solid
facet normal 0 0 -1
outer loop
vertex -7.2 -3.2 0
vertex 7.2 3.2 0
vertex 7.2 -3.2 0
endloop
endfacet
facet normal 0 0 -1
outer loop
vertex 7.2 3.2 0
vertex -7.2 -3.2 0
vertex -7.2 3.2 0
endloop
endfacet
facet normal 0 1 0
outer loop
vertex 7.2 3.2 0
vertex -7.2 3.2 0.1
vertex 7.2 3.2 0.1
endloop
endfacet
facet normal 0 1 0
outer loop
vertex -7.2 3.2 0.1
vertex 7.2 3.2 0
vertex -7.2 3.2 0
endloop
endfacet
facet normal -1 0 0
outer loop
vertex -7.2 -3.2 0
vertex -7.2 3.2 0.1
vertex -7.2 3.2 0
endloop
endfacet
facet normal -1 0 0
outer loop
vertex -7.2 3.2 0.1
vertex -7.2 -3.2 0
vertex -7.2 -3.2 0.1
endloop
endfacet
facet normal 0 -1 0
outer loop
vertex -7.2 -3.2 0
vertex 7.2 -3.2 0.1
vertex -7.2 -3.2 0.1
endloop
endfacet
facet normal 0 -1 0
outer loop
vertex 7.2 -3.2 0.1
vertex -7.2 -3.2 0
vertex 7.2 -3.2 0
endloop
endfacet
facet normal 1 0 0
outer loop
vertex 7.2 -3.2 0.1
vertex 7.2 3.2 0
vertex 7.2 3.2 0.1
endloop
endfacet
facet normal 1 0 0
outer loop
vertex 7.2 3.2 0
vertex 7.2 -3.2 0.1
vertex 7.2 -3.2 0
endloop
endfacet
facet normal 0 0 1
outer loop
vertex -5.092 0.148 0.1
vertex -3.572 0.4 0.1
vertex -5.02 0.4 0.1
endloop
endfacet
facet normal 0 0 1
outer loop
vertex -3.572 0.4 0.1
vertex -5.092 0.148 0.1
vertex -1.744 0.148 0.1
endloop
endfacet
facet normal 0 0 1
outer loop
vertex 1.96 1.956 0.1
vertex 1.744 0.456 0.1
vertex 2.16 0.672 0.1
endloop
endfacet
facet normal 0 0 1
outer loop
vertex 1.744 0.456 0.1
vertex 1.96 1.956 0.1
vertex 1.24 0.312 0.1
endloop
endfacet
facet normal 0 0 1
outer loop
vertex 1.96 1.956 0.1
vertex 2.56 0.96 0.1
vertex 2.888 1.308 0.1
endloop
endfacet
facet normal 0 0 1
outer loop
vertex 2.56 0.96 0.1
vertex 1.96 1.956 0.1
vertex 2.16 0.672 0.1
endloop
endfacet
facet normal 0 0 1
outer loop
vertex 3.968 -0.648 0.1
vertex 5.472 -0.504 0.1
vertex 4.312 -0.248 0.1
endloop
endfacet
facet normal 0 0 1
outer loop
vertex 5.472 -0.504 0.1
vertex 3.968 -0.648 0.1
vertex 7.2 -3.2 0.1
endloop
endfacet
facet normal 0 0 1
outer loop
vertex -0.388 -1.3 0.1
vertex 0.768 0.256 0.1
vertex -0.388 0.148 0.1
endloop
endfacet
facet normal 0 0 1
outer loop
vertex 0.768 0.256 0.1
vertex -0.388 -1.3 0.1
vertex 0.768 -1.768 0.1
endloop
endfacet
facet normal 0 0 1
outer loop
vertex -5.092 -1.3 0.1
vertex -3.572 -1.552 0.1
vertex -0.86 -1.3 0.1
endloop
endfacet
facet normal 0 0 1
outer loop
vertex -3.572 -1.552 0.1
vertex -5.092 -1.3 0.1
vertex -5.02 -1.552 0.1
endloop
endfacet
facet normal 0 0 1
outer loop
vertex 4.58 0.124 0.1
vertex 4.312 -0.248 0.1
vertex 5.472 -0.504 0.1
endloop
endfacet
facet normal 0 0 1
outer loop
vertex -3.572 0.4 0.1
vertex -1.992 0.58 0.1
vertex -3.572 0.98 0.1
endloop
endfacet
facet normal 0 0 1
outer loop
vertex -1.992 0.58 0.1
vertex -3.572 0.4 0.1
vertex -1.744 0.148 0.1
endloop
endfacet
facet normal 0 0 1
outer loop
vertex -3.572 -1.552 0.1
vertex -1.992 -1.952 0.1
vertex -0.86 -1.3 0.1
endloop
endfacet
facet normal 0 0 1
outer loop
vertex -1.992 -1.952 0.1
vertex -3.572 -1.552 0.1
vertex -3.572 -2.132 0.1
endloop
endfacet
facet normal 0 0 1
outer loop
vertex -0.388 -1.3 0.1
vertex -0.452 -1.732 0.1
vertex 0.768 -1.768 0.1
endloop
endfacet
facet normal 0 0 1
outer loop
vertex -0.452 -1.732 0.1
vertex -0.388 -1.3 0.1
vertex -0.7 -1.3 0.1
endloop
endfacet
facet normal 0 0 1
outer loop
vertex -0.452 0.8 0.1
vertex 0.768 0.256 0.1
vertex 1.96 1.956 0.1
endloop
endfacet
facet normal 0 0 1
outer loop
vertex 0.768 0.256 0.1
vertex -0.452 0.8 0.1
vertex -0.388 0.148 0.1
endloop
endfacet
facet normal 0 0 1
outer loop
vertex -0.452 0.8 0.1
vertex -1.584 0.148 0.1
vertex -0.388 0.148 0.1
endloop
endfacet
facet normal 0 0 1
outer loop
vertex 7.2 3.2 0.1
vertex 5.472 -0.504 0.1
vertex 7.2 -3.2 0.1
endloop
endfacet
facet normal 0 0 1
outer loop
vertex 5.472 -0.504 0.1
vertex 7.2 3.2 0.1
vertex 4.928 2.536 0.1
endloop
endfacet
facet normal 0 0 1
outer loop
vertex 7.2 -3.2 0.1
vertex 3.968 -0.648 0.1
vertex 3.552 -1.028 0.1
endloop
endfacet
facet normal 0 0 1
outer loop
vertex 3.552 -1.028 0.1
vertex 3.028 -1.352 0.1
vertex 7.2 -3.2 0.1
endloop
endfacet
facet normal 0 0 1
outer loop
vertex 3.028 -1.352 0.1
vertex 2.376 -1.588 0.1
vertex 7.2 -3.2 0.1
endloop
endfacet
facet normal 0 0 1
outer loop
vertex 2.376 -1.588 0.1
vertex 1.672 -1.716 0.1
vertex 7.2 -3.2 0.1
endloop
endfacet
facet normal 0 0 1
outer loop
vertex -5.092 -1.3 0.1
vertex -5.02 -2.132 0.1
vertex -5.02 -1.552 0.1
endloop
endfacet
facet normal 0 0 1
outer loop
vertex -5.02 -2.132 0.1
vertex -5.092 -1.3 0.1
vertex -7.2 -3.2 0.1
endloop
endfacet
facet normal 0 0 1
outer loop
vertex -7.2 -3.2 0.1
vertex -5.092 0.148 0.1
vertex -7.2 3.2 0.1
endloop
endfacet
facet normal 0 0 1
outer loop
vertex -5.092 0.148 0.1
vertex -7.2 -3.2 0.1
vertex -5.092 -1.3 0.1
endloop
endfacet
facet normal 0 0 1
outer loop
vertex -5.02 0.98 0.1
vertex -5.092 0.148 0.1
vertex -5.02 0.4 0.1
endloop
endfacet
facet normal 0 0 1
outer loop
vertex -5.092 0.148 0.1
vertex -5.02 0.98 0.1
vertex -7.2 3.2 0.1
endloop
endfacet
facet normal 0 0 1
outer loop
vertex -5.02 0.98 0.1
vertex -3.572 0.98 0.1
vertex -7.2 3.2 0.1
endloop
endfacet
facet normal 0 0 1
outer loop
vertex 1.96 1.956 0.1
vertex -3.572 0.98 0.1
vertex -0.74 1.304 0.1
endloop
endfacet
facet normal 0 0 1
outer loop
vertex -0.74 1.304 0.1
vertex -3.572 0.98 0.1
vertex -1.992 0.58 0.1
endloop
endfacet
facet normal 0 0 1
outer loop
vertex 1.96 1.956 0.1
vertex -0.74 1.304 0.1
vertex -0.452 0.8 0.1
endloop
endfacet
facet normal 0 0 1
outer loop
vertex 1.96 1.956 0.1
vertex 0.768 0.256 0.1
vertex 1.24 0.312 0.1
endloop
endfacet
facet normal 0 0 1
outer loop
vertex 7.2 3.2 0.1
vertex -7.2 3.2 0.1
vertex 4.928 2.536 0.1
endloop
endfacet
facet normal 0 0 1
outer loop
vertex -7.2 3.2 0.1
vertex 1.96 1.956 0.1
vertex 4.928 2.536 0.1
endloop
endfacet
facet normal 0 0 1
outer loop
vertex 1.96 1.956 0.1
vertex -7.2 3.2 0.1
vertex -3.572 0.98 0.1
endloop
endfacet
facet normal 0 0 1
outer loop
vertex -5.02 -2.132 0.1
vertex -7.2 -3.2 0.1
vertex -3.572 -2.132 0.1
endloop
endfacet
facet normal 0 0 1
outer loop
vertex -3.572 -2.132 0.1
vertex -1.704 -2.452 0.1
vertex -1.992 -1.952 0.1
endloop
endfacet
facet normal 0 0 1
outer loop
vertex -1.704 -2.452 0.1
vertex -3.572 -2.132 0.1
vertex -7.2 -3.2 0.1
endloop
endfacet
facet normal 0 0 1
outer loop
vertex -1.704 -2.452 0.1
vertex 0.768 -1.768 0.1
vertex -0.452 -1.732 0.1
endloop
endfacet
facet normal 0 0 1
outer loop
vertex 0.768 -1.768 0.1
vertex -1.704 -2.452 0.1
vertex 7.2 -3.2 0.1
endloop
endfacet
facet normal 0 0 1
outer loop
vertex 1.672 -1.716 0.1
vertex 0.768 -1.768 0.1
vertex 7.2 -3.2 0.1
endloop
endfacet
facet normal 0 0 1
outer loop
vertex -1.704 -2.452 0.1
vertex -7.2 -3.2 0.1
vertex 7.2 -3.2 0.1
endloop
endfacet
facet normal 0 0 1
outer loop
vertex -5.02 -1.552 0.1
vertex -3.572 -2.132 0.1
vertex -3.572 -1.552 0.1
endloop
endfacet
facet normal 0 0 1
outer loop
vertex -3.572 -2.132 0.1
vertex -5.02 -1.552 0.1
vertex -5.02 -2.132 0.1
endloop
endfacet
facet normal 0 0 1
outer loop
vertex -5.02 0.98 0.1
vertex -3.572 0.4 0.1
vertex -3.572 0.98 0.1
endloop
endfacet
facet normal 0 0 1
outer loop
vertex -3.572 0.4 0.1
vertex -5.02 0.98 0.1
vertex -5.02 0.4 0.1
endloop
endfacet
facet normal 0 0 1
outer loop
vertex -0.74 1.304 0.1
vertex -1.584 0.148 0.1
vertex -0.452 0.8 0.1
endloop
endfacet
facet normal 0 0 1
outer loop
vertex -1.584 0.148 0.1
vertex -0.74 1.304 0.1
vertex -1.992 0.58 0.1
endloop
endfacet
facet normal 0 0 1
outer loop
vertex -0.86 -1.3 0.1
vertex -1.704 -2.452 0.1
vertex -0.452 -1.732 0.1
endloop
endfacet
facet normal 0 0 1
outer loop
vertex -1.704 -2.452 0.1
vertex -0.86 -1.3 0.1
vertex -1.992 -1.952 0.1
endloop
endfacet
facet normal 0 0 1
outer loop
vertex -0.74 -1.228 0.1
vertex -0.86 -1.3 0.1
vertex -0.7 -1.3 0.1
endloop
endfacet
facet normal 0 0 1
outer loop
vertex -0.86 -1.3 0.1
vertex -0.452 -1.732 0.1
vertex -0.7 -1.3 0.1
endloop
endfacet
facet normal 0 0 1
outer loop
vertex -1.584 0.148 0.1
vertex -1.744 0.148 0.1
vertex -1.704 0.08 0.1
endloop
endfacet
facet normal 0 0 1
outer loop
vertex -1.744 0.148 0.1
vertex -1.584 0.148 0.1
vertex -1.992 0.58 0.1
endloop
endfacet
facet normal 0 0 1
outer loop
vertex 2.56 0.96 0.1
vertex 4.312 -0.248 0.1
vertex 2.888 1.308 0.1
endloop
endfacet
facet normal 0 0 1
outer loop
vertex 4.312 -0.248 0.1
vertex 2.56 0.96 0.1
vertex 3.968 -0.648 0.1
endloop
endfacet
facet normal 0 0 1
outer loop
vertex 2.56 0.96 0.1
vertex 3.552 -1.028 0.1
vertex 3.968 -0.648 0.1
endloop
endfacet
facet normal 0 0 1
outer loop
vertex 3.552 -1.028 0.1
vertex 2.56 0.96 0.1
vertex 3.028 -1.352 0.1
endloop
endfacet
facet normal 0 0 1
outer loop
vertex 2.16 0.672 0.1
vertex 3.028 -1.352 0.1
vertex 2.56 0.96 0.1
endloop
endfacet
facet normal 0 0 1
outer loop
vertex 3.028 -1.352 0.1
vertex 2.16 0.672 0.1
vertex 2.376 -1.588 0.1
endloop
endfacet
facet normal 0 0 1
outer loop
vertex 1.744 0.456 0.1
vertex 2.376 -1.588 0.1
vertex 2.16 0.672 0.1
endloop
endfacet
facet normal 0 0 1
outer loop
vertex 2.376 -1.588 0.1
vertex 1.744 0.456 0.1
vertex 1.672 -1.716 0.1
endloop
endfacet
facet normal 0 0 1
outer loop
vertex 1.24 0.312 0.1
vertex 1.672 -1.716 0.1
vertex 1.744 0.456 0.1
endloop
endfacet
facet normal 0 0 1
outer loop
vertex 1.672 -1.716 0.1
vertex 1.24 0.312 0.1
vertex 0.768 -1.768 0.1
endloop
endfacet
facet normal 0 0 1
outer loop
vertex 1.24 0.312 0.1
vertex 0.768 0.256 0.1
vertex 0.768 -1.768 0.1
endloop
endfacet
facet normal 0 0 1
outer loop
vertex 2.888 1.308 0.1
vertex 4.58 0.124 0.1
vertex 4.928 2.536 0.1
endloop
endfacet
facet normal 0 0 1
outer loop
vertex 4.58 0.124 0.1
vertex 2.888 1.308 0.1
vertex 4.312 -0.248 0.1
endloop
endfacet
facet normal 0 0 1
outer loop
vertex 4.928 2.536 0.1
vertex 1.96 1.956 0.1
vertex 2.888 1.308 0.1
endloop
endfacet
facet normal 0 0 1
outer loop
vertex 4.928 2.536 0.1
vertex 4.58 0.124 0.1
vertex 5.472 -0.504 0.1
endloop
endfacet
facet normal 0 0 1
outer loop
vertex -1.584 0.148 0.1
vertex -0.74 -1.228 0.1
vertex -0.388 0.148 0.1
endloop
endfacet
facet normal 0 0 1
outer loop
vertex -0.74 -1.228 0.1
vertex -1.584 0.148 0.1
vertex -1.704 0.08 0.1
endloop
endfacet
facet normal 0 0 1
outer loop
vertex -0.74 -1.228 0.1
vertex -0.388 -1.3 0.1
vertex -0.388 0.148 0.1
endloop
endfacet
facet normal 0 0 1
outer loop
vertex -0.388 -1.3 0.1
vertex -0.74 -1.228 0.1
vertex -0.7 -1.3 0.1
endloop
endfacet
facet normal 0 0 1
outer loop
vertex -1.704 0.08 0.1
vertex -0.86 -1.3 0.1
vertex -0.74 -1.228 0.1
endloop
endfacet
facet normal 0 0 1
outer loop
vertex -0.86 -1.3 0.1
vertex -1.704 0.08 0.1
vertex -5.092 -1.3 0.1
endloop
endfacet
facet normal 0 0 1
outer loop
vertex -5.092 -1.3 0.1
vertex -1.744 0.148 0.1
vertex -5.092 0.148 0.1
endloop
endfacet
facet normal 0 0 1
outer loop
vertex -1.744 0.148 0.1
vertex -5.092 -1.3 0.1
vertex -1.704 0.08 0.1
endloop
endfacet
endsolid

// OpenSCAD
// file: ../p/box5-12.scad
use <../lib.scad>
function ldraw_lib__box5_12() = [
// 0 Box with 5 Faces without Any Edges
// 0 Name: box5-12.dat
// 0 Author: Chris Dee [cwdee]
// 0 !LDRAW_ORG Primitive UPDATE 2009-02
// 0 !LICENSE Licensed under CC BY 4.0 : see CAreadme.txt
// 
// 0 BFC CERTIFY CCW
  [0,"BFC","CERTIFY"],
  [0,"BFC","CCW"],
// 
// 0 !HISTORY 2009-09-03 [PTadmin] Official Update 2009-02
// 
// 
// 4 16 1 1 1 1 1 -1 -1 1 -1 -1 1 1
  [4,16,1,1,1,1,1,-1,-1,1,-1,-1,1,1],
// 4 16 -1 0 1 1 0 1 1 1 1 -1 1 1
  [4,16,-1,0,1,1,0,1,1,1,1,-1,1,1],
// 4 16 -1 0 -1 -1 0 1 -1 1 1 -1 1 -1
  [4,16,-1,0,-1,-1,0,1,-1,1,1,-1,1,-1],
// 4 16 1 0 -1 -1 0 -1 -1 1 -1 1 1 -1
  [4,16,1,0,-1,-1,0,-1,-1,1,-1,1,1,-1],
// 4 16 1 0 1 1 0 -1 1 1 -1 1 1 1
  [4,16,1,0,1,1,0,-1,1,1,-1,1,1,1],
// 0
];
module ldraw_lib__box5_12(step=0, col=false, unit=2/5, alt=false, line=0.2, solid=!$preview)
    makepoly(ldraw_lib__box5_12(), step=step, col=col, unit=unit, alt=alt, line=line, solid=solid);
ldraw_lib__box5_12(line=0.2);
// main file
use <../lib.scad>
use <../p/box5-12.scad>
function ldraw_lib__821577g() = [
// 0 Sticker  0.8 x  1.8 with Car and Red Left Curved Arrow
// 0 Name: 821577g.dat
// 0 Author: Evert-Jan Boer [ejboer]
// 0 !LDRAW_ORG Part UPDATE 2026-07
// 0 !LICENSE Licensed under CC BY 4.0 : see CAreadme.txt
// 
// 0 BFC CERTIFY CCW
  [0,"BFC","CERTIFY"],
  [0,"BFC","CCW"],
// 
// 0 !CATEGORY Sticker
// 0 !KEYWORDS Multi Control, Set 8082
// 
// 0 !HISTORY 2026-07-30 [OrionP] Official Update 2026-07
// 
// 1 16 0 -.25 0 18 0 0 0 0.25 0 0 0 8 box5-12.dat
  [1,16,0,-.25,0,18,0,0,0,0.25,0,0,0,8, ldraw_lib__box5_12()],
// 4 16 -12.73 -.25 .37 -4.36 -.25 .37 -8.93 -.25 1 -12.55 -.25 1
  [4,16,-12.73,-.25,.37,-4.36,-.25,.37,-8.93,-.25,1,-12.55,-.25,1],
// 4 16 4.9 -.25 4.89 3.1 -.25 .78 4.36 -.25 1.14 5.4 -.25 1.68
  [4,16,4.9,-.25,4.89,3.1,-.25,.78,4.36,-.25,1.14,5.4,-.25,1.68],
// 4 16 4.9 -.25 4.89 5.4 -.25 1.68 6.4 -.25 2.4 7.22 -.25 3.27
  [4,16,4.9,-.25,4.89,5.4,-.25,1.68,6.4,-.25,2.4,7.22,-.25,3.27],
// 4 16 13.68 -.25 -1.26 10.78 -.25 -.62 9.92 -.25 -1.62 18 -.25 -8
  [4,16,13.68,-.25,-1.26,10.78,-.25,-.62,9.92,-.25,-1.62,18,-.25,-8],
// 4 16 -.97 -.25 -3.25 1.92 -.25 -4.42 1.92 -.25 .64 -.97 -.25 .37
  [4,16,-.97,-.25,-3.25,1.92,-.25,-4.42,1.92,-.25,.64,-.97,-.25,.37],
// 4 16 -12.73 -.25 -3.25 -12.55 -.25 -3.88 -8.93 -.25 -3.88 -2.15 -.25 -3.25
  [4,16,-12.73,-.25,-3.25,-12.55,-.25,-3.88,-8.93,-.25,-3.88,-2.15,-.25,-3.25],
// 3 16 11.45 -.25 .31 10.78 -.25 -.62 13.68 -.25 -1.26
  [3,16,11.45,-.25,.31,10.78,-.25,-.62,13.68,-.25,-1.26],
// 4 16 -8.93 -.25 1 -4.36 -.25 .37 -4.98 -.25 1.45 -8.93 -.25 2.45
  [4,16,-8.93,-.25,1,-4.36,-.25,.37,-4.98,-.25,1.45,-8.93,-.25,2.45],
// 4 16 -4.98 -.25 -4.88 -2.15 -.25 -3.25 -8.93 -.25 -3.88 -8.93 -.25 -5.33
  [4,16,-4.98,-.25,-4.88,-2.15,-.25,-3.25,-8.93,-.25,-3.88,-8.93,-.25,-5.33],
// 4 16 -.97 -.25 -3.25 -1.75 -.25 -3.25 -1.13 -.25 -4.33 1.92 -.25 -4.42
  [4,16,-.97,-.25,-3.25,-1.75,-.25,-3.25,-1.13,-.25,-4.33,1.92,-.25,-4.42],
// 4 16 -1.13 -.25 2 -.97 -.25 .37 1.92 -.25 .64 4.9 -.25 4.89
  [4,16,-1.13,-.25,2,-.97,-.25,.37,1.92,-.25,.64,4.9,-.25,4.89],
// 3 16 -1.13 -.25 2 -3.96 -.25 .37 -.97 -.25 .37
  [3,16,-1.13,-.25,2,-3.96,-.25,.37,-.97,-.25,.37],
// 4 16 12.32 -.25 6.34 13.68 -.25 -1.26 18 -.25 -8 18 -.25 8
  [4,16,12.32,-.25,6.34,13.68,-.25,-1.26,18,-.25,-8,18,-.25,8],
// 3 16 18 -.25 -8 9.92 -.25 -1.62 8.88 -.25 -2.57
  [3,16,18,-.25,-8,9.92,-.25,-1.62,8.88,-.25,-2.57],
// 3 16 8.88 -.25 -2.57 7.57 -.25 -3.38 18 -.25 -8
  [3,16,8.88,-.25,-2.57,7.57,-.25,-3.38,18,-.25,-8],
// 3 16 7.57 -.25 -3.38 5.94 -.25 -3.97 18 -.25 -8
  [3,16,7.57,-.25,-3.38,5.94,-.25,-3.97,18,-.25,-8],
// 3 16 5.94 -.25 -3.97 4.18 -.25 -4.29 18 -.25 -8
  [3,16,5.94,-.25,-3.97,4.18,-.25,-4.29,18,-.25,-8],
// 4 16 -12.73 -.25 -3.25 -18 -.25 -8 -12.55 -.25 -5.33 -12.55 -.25 -3.88
  [4,16,-12.73,-.25,-3.25,-18,-.25,-8,-12.55,-.25,-5.33,-12.55,-.25,-3.88],
// 4 16 -12.73 -.25 .37 -18 -.25 8 -18 -.25 -8 -12.73 -.25 -3.25
  [4,16,-12.73,-.25,.37,-18,-.25,8,-18,-.25,-8,-12.73,-.25,-3.25],
// 4 16 -18 -.25 8 -12.73 -.25 .37 -12.55 -.25 1 -12.55 -.25 2.45
  [4,16,-18,-.25,8,-12.73,-.25,.37,-12.55,-.25,1,-12.55,-.25,2.45],
// 3 16 -12.55 -.25 2.45 -8.93 -.25 2.45 -18 -.25 8
  [3,16,-12.55,-.25,2.45,-8.93,-.25,2.45,-18,-.25,8],
// 3 16 4.9 -.25 4.89 -8.93 -.25 2.45 -1.85 -.25 3.26
  [3,16,4.9,-.25,4.89,-8.93,-.25,2.45,-1.85,-.25,3.26],
// 3 16 -1.85 -.25 3.26 -8.93 -.25 2.45 -4.98 -.25 1.45
  [3,16,-1.85,-.25,3.26,-8.93,-.25,2.45,-4.98,-.25,1.45],
// 3 16 4.9 -.25 4.89 -1.85 -.25 3.26 -1.13 -.25 2
  [3,16,4.9,-.25,4.89,-1.85,-.25,3.26,-1.13,-.25,2],
// 3 16 4.9 -.25 4.89 1.92 -.25 .64 3.1 -.25 .78
  [3,16,4.9,-.25,4.89,1.92,-.25,.64,3.1,-.25,.78],
// 3 16 18 -.25 8 -18 -.25 8 12.32 -.25 6.34
  [3,16,18,-.25,8,-18,-.25,8,12.32,-.25,6.34],
// 4 16 -8.93 -.25 2.45 4.9 -.25 4.89 12.32 -.25 6.34 -18 -.25 8
  [4,16,-8.93,-.25,2.45,4.9,-.25,4.89,12.32,-.25,6.34,-18,-.25,8],
// 3 16 -12.55 -.25 -5.33 -18 -.25 -8 -8.93 -.25 -5.33
  [3,16,-12.55,-.25,-5.33,-18,-.25,-8,-8.93,-.25,-5.33],
// 4 16 -8.93 -.25 -5.33 -18 -.25 -8 -4.26 -.25 -6.13 -4.98 -.25 -4.88
  [4,16,-8.93,-.25,-5.33,-18,-.25,-8,-4.26,-.25,-6.13,-4.98,-.25,-4.88],
// 4 16 1.92 -.25 -4.42 -1.13 -.25 -4.33 -4.26 -.25 -6.13 18 -.25 -8
  [4,16,1.92,-.25,-4.42,-1.13,-.25,-4.33,-4.26,-.25,-6.13,18,-.25,-8],
// 3 16 4.18 -.25 -4.29 1.92 -.25 -4.42 18 -.25 -8
  [3,16,4.18,-.25,-4.29,1.92,-.25,-4.42,18,-.25,-8],
// 3 16 -4.26 -.25 -6.13 -18 -.25 -8 18 -.25 -8
  [3,16,-4.26,-.25,-6.13,-18,-.25,-8,18,-.25,-8],
// 
// 0 BFC NOCLIP
  [0,"BFC","NOCLIP"],
// 
// 4 14 -12.55 -.25 -3.88 -12.55 -.25 -5.33 -8.93 -.25 -5.33 -8.93 -.25 -3.88
  [4,14,-12.55,-.25,-3.88,-12.55,-.25,-5.33,-8.93,-.25,-5.33,-8.93,-.25,-3.88],
// 4 14 -8.93 -.25 1 -8.93 -.25 2.45 -12.55 -.25 2.45 -12.55 -.25 1
  [4,14,-8.93,-.25,1,-8.93,-.25,2.45,-12.55,-.25,2.45,-12.55,-.25,1],
// 4 14 -4.98 -.25 1.45 -3.96 -.25 .37 -1.13 -.25 2 -1.85 -.25 3.26
  [4,14,-4.98,-.25,1.45,-3.96,-.25,.37,-1.13,-.25,2,-1.85,-.25,3.26],
// 4 14 -4.98 -.25 -4.88 -4.26 -.25 -6.13 -1.13 -.25 -4.33 -2.15 -.25 -3.25
  [4,14,-4.98,-.25,-4.88,-4.26,-.25,-6.13,-1.13,-.25,-4.33,-2.15,-.25,-3.25],
// 3 14 -1.85 -.25 -3.07 -2.15 -.25 -3.25 -1.75 -.25 -3.25
  [3,14,-1.85,-.25,-3.07,-2.15,-.25,-3.25,-1.75,-.25,-3.25],
// 3 14 -2.15 -.25 -3.25 -1.13 -.25 -4.33 -1.75 -.25 -3.25
  [3,14,-2.15,-.25,-3.25,-1.13,-.25,-4.33,-1.75,-.25,-3.25],
// 4 14 -4.26 -.25 .2 -3.96 -.25 .37 -4.98 -.25 1.45 -4.36 -.25 .37
  [4,14,-4.26,-.25,.2,-3.96,-.25,.37,-4.98,-.25,1.45,-4.36,-.25,.37],
// 4 4 6.4 -.25 2.4 9.92 -.25 -1.62 10.78 -.25 -.62 7.22 -.25 3.27
  [4,4,6.4,-.25,2.4,9.92,-.25,-1.62,10.78,-.25,-.62,7.22,-.25,3.27],
// 4 4 6.4 -.25 2.4 7.57 -.25 -3.38 8.88 -.25 -2.57 9.92 -.25 -1.62
  [4,4,6.4,-.25,2.4,7.57,-.25,-3.38,8.88,-.25,-2.57,9.92,-.25,-1.62],
// 4 4 7.57 -.25 -3.38 6.4 -.25 2.4 5.4 -.25 1.68 5.94 -.25 -3.97
  [4,4,7.57,-.25,-3.38,6.4,-.25,2.4,5.4,-.25,1.68,5.94,-.25,-3.97],
// 4 4 5.94 -.25 -3.97 5.4 -.25 1.68 4.36 -.25 1.14 4.18 -.25 -4.29
  [4,4,5.94,-.25,-3.97,5.4,-.25,1.68,4.36,-.25,1.14,4.18,-.25,-4.29],
// 4 4 4.18 -.25 -4.29 4.36 -.25 1.14 3.1 -.25 .78 1.92 -.25 -4.42
  [4,4,4.18,-.25,-4.29,4.36,-.25,1.14,3.1,-.25,.78,1.92,-.25,-4.42],
// 3 4 3.1 -.25 .78 1.92 -.25 .64 1.92 -.25 -4.42
  [3,4,3.1,-.25,.78,1.92,-.25,.64,1.92,-.25,-4.42],
// 4 4 11.45 -.25 .31 12.32 -.25 6.34 7.22 -.25 3.27 10.78 -.25 -.62
  [4,4,11.45,-.25,.31,12.32,-.25,6.34,7.22,-.25,3.27,10.78,-.25,-.62],
// 3 4 12.32 -.25 6.34 4.9 -.25 4.89 7.22 -.25 3.27
  [3,4,12.32,-.25,6.34,4.9,-.25,4.89,7.22,-.25,3.27],
// 3 4 12.32 -.25 6.34 11.45 -.25 .31 13.68 -.25 -1.26
  [3,4,12.32,-.25,6.34,11.45,-.25,.31,13.68,-.25,-1.26],
// 4 0 -4.26 -.25 .2 -1.85 -.25 -3.07 -.97 -.25 .37 -3.96 -.25 .37
  [4,0,-4.26,-.25,.2,-1.85,-.25,-3.07,-.97,-.25,.37,-3.96,-.25,.37],
// 4 0 -.97 -.25 -3.25 -.97 -.25 .37 -1.85 -.25 -3.07 -1.75 -.25 -3.25
  [4,0,-.97,-.25,-3.25,-.97,-.25,.37,-1.85,-.25,-3.07,-1.75,-.25,-3.25],
// 4 0 -2.15 -.25 -3.25 -1.85 -.25 -3.07 -4.26 -.25 .2 -12.73 -.25 -3.25
  [4,0,-2.15,-.25,-3.25,-1.85,-.25,-3.07,-4.26,-.25,.2,-12.73,-.25,-3.25],
// 4 0 -12.73 -.25 -3.25 -4.26 -.25 .2 -4.36 -.25 .37 -12.73 -.25 .37
  [4,0,-12.73,-.25,-3.25,-4.26,-.25,.2,-4.36,-.25,.37,-12.73,-.25,.37],
];
module ldraw_lib__821577g(step=0, col=false, unit=2/5, alt=false, line=0.2, solid=!$preview)
    makepoly(ldraw_lib__821577g(), step=step, col=col, unit=unit, alt=alt, line=line, solid=solid);
ldraw_lib__821577g(line=0.2);
